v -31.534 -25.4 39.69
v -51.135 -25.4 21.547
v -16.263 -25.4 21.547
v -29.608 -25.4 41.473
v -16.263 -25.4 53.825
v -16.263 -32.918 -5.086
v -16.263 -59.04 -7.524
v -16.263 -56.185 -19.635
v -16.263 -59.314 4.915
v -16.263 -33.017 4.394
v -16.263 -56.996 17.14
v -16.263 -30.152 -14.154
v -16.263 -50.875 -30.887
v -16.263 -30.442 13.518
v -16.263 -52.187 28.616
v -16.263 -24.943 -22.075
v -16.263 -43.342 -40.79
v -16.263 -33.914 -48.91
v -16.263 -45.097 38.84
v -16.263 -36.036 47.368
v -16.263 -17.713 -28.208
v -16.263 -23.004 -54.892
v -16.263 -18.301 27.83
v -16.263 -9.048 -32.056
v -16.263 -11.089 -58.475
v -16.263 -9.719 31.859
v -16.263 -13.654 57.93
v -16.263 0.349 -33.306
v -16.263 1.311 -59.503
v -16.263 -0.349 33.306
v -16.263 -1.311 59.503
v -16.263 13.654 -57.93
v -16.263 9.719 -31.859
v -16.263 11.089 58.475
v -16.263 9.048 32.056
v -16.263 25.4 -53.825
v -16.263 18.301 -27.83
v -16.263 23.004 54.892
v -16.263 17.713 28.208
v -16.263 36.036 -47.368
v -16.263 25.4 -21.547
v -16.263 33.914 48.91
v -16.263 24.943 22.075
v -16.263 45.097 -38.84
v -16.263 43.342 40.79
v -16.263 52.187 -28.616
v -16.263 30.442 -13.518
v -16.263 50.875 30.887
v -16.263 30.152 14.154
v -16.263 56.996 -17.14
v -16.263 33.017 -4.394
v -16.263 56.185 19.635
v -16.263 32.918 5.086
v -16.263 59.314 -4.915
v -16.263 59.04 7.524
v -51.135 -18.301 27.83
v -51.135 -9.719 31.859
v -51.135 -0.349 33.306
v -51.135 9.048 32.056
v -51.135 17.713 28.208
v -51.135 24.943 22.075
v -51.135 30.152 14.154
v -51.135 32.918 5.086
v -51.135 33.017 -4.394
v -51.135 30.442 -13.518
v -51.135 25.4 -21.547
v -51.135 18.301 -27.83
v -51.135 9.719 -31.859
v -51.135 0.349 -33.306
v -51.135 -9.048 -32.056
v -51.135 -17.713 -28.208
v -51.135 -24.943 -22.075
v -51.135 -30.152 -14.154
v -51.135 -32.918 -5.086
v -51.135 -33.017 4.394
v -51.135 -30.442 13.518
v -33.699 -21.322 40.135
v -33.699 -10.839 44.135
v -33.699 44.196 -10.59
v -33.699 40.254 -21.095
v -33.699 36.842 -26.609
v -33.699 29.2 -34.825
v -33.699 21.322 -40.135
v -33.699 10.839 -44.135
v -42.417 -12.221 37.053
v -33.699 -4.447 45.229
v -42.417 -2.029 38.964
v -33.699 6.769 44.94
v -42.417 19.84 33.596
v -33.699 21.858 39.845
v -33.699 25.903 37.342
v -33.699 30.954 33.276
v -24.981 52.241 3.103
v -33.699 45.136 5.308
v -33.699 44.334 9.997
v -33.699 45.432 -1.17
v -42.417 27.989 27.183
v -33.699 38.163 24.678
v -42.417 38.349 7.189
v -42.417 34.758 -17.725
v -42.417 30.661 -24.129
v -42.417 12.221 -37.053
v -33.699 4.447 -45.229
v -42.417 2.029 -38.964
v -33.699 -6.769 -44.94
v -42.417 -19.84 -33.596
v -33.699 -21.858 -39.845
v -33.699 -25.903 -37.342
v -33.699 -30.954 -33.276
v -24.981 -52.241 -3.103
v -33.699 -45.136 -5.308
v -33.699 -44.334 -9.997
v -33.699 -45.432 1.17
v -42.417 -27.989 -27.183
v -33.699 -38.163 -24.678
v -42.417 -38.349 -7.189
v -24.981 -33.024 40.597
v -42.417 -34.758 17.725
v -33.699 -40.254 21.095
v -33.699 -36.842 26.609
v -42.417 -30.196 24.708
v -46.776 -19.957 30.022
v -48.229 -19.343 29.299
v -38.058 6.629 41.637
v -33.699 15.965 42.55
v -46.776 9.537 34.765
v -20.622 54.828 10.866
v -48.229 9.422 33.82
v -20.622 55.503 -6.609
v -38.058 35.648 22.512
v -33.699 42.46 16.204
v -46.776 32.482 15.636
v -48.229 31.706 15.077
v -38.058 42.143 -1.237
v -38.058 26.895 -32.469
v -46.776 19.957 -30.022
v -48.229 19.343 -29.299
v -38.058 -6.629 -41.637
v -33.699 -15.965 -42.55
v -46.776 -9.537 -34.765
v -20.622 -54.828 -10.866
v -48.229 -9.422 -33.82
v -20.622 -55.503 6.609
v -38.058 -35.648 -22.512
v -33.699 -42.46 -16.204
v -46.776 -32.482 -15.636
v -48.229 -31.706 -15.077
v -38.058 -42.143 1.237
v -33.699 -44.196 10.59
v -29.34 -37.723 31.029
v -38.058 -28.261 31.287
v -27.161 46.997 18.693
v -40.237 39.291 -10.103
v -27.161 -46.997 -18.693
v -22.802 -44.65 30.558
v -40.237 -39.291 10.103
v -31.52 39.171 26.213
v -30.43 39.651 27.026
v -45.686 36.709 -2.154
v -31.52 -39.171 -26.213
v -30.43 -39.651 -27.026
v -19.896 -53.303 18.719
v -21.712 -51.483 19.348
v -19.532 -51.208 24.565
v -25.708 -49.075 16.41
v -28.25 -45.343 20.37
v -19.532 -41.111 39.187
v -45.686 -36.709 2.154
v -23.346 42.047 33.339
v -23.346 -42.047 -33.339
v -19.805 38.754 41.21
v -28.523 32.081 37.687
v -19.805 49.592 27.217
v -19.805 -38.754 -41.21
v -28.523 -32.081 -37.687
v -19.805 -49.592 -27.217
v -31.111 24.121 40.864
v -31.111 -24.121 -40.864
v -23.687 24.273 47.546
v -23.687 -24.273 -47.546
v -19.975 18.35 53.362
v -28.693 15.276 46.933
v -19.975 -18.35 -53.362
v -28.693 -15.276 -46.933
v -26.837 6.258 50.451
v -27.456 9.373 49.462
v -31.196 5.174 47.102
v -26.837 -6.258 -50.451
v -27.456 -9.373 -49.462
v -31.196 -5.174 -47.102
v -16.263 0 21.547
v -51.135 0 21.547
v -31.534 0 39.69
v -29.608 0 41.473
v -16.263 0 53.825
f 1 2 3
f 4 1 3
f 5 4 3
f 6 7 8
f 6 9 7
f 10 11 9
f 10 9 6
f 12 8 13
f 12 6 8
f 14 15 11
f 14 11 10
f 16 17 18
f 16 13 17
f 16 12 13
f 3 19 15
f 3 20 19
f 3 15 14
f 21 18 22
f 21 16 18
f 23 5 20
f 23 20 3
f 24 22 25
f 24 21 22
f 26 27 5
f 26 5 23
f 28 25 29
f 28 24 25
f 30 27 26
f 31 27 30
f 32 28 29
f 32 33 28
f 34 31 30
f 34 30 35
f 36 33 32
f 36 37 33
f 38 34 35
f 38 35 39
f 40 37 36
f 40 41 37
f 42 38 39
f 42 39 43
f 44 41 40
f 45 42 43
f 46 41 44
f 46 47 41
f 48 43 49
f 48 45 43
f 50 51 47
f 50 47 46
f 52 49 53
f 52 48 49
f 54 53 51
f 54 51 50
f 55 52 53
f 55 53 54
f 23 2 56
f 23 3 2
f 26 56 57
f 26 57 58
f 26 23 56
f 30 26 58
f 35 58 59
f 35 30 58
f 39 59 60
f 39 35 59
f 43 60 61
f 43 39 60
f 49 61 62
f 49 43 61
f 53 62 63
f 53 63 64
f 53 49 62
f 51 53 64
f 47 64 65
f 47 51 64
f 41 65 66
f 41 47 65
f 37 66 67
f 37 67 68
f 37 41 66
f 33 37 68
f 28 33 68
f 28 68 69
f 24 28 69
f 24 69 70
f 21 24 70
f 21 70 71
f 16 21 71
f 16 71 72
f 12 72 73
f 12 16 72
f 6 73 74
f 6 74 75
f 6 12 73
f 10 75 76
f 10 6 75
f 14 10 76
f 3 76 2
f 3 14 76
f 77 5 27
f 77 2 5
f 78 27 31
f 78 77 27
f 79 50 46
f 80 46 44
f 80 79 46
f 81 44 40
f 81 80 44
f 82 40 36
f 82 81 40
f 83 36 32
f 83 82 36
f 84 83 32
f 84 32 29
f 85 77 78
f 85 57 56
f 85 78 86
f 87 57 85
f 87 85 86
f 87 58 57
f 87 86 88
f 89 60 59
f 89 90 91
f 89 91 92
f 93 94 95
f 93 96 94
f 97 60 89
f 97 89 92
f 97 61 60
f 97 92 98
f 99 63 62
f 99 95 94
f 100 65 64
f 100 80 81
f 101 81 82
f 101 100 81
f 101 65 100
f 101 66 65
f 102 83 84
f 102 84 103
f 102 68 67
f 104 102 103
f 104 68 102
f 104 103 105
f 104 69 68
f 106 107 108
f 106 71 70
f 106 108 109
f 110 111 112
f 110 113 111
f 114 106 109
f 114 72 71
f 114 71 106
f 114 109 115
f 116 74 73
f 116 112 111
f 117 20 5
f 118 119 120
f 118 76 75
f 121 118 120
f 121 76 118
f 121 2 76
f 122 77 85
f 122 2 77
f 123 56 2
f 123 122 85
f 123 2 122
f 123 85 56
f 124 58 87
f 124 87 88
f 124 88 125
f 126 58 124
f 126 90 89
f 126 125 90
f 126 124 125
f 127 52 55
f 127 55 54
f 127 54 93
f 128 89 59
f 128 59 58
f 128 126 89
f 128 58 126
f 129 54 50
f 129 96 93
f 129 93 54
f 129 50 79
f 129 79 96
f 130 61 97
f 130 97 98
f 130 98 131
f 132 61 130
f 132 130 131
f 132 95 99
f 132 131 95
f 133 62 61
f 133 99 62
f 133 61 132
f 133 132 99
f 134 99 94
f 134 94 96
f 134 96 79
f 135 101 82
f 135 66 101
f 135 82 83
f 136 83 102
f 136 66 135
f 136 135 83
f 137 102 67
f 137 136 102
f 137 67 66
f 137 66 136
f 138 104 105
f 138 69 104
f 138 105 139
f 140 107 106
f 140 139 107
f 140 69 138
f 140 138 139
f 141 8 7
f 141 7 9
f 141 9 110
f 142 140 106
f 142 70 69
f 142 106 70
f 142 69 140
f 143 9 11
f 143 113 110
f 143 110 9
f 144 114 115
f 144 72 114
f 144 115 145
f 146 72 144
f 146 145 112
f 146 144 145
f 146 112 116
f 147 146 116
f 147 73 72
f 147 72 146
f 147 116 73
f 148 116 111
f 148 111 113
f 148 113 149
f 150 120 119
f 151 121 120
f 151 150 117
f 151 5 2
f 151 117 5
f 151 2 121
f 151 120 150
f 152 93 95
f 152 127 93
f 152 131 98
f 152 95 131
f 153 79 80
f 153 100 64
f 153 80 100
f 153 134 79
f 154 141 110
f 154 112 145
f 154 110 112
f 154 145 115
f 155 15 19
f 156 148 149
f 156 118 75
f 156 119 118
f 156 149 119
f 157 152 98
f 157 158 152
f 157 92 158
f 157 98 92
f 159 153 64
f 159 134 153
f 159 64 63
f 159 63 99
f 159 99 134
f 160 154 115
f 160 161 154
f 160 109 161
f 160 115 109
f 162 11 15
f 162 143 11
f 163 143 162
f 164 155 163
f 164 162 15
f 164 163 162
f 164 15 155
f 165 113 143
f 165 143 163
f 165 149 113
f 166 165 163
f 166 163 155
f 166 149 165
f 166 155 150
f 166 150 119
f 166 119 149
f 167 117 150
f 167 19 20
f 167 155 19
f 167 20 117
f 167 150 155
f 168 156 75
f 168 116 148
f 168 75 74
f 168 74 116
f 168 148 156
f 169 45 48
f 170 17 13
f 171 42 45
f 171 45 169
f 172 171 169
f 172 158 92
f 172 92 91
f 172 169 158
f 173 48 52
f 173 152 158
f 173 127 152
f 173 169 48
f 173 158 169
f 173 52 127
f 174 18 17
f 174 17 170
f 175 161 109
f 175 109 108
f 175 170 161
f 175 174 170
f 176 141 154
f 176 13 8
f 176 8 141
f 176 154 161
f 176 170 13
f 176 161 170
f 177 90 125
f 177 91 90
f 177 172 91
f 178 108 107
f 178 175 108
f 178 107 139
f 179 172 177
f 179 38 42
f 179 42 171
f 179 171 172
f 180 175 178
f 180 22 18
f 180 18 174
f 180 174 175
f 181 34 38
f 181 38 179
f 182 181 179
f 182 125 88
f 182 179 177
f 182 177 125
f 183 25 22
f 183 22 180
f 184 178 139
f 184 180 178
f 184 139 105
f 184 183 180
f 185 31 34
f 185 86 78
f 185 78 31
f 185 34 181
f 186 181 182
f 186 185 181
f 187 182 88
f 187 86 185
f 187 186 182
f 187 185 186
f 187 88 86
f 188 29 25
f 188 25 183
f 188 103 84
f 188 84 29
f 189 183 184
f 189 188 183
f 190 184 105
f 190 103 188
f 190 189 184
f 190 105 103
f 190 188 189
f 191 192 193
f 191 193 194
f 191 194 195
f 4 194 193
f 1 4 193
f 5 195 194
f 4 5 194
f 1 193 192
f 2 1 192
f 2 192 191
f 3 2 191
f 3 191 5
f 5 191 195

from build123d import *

# Parameters (mm, degrees)
F1_DEPTH = 25.4


with BuildPart() as f1:
    # F0 (on Front) → F1 (new body)
    with BuildSketch(Plane.XZ):
        Polygon((-16.263214, 53.824995), (-29.607564, 41.473199), (-31.534202, 39.689864), (-51.134761, 21.547196), (-16.263214, 21.547196), align=None)
    extrude(amount=F1_DEPTH)


with BuildPart() as f3:
    # F1_face (on face) → F3 (revolve)
    with BuildSketch(Plane(origin=(-27.887063, -25.4, 32.306463), x_dir=(1, 0, 0), z_dir=(0, -1, 0))):
        Polygon((11.623849, 21.518532), (-23.247698, -10.759266), (11.623849, -10.759266), align=None)
    revolve(axis=Axis((2.113082, 0, 0), (-1, 0, 0)))


solid = Compound([f1.part, f3.part])
